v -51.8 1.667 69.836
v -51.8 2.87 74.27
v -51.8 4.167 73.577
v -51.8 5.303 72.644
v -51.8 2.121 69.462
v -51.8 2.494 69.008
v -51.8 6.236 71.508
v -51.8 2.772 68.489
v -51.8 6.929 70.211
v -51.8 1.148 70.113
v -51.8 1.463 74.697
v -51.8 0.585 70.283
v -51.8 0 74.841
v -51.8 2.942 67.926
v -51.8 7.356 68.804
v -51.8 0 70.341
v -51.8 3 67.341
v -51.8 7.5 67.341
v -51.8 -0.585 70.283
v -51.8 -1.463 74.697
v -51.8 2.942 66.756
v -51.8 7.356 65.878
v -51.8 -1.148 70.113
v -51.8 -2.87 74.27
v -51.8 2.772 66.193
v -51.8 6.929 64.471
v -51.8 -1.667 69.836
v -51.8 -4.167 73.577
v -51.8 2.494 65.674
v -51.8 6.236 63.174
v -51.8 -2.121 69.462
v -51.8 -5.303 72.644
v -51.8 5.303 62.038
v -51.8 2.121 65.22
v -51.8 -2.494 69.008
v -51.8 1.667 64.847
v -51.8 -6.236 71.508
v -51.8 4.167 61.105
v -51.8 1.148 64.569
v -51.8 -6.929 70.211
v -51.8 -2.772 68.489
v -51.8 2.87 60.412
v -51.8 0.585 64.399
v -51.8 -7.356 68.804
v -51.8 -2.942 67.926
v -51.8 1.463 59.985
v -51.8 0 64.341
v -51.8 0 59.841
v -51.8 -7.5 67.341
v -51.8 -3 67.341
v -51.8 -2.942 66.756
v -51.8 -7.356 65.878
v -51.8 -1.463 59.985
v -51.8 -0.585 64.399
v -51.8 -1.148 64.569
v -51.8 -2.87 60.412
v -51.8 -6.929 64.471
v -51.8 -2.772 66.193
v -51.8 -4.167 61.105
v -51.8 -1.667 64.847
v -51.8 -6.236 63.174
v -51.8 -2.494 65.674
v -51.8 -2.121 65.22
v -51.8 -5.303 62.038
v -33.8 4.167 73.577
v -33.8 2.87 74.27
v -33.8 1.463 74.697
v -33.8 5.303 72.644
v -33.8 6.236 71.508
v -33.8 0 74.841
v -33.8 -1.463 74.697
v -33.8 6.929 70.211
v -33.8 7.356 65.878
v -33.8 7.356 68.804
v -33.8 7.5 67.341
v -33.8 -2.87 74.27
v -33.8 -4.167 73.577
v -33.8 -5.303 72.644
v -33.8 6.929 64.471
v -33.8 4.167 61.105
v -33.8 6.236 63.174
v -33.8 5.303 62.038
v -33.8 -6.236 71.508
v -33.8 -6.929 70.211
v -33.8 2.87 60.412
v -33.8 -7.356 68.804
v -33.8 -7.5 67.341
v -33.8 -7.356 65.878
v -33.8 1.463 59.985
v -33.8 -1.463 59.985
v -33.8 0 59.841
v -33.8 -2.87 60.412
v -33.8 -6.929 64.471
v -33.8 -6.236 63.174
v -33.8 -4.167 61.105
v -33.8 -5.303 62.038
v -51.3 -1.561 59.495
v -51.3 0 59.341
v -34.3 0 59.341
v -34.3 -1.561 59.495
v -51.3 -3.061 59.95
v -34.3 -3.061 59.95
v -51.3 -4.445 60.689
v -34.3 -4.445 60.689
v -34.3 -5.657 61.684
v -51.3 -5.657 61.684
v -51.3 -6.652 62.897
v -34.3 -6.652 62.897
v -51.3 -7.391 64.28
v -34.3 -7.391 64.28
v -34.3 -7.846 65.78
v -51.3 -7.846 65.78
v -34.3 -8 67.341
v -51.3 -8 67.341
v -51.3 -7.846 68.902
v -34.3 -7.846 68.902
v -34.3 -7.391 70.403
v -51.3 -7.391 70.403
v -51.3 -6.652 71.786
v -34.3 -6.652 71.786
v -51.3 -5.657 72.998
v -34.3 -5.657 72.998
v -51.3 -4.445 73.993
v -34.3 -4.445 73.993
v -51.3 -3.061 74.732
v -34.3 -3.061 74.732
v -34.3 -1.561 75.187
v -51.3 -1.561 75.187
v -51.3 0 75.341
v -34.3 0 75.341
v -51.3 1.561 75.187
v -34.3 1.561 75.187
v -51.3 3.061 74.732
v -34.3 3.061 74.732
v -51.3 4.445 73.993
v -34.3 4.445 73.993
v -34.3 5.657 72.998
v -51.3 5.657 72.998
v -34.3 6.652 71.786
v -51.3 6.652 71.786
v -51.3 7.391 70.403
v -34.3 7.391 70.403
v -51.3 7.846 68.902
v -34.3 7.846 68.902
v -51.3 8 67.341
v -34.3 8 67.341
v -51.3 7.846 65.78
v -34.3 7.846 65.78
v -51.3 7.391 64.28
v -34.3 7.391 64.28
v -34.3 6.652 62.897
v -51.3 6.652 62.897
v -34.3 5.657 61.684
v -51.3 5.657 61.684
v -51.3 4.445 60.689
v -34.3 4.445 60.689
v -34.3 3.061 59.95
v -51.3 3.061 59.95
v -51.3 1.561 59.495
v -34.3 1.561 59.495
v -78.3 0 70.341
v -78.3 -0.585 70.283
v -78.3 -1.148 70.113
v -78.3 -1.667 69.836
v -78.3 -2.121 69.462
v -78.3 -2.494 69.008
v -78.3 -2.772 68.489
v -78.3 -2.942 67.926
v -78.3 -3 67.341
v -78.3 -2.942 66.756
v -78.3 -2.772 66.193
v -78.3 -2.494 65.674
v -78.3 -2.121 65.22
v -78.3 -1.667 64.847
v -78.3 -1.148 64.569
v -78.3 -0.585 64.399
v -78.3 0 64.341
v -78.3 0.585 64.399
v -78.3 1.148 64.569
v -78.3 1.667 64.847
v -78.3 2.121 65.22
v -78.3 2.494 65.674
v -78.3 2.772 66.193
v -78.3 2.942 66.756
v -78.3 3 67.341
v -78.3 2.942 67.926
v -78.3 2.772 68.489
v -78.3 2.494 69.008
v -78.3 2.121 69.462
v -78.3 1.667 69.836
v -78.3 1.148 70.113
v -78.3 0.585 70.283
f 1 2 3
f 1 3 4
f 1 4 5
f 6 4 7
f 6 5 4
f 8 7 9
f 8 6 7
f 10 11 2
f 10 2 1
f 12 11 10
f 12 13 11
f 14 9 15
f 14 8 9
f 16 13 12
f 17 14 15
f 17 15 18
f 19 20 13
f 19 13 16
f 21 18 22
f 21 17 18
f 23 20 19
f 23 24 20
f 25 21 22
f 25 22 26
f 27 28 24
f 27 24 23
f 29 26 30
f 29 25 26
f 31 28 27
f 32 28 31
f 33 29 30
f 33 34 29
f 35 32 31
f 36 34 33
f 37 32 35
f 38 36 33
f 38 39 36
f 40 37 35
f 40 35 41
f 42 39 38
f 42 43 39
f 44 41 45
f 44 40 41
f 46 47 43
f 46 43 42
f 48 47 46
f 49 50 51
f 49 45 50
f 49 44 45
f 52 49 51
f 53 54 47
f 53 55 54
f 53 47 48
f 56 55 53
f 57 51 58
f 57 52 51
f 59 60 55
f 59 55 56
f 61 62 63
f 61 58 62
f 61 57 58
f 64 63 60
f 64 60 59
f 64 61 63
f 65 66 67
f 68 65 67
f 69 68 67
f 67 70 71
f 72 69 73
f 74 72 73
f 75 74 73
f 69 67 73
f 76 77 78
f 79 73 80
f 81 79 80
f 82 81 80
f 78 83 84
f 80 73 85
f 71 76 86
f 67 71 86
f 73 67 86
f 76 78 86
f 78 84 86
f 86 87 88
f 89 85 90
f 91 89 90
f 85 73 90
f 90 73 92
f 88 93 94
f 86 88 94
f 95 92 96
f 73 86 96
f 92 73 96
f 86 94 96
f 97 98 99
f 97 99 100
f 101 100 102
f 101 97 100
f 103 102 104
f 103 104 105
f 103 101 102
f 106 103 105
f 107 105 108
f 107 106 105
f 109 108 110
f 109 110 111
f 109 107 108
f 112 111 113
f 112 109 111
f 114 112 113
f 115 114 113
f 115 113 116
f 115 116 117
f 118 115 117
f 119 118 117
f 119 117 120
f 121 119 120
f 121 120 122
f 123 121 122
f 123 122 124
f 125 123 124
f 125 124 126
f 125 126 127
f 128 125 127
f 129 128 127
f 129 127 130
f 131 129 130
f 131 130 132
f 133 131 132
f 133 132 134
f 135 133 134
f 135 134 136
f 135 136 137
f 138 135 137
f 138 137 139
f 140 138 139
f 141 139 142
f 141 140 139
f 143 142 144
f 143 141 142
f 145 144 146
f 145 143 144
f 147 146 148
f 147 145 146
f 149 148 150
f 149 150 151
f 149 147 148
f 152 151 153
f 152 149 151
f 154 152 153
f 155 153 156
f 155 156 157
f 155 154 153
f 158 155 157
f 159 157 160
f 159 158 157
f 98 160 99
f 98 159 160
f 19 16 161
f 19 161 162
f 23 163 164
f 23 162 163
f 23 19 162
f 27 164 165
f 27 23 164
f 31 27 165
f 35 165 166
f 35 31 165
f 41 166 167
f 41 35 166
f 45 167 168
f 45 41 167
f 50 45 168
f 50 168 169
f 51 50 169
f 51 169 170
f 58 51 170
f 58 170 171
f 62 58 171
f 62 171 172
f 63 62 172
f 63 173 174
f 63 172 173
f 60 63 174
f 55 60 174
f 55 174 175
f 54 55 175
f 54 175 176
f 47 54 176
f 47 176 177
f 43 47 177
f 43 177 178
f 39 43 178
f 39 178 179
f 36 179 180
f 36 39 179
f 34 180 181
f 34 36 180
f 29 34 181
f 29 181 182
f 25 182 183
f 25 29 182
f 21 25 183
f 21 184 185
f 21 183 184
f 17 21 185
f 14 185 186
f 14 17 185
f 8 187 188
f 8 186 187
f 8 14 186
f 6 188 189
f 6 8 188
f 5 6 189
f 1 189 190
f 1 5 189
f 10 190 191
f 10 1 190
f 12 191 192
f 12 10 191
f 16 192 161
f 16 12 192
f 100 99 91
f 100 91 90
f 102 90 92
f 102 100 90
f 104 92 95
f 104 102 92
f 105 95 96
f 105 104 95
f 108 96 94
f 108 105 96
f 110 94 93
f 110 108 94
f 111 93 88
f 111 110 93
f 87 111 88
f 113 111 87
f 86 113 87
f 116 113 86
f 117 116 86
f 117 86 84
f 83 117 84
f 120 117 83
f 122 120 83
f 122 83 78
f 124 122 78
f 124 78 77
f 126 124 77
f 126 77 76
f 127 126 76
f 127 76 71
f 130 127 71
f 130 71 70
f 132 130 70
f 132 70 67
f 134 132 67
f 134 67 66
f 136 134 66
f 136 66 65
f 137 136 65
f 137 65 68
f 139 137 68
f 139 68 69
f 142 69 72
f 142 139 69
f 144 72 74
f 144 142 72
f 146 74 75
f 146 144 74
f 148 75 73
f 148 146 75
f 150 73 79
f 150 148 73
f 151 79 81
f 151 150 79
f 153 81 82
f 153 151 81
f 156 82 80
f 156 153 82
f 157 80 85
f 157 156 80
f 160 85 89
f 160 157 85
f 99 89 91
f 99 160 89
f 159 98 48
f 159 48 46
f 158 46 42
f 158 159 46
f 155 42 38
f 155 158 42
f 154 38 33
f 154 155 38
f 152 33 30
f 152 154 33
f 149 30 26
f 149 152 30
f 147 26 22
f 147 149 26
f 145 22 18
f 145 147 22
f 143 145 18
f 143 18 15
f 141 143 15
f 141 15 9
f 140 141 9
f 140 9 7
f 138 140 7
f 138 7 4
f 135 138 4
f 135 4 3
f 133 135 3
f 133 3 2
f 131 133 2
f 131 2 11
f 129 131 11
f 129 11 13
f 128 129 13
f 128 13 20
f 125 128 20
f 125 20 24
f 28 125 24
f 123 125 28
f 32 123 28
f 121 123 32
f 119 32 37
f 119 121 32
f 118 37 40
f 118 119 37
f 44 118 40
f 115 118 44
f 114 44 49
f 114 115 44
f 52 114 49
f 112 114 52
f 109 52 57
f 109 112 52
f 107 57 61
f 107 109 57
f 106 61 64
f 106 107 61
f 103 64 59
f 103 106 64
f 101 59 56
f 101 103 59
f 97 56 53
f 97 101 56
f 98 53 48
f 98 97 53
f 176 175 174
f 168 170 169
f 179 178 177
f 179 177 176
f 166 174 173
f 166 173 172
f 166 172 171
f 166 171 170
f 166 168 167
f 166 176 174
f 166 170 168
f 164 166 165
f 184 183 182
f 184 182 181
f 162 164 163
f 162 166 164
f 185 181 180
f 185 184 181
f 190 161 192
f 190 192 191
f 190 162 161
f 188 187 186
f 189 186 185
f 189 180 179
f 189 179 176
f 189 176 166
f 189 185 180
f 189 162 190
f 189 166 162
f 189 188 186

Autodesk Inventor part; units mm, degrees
ref_plane "YZ Plane" through (0, 0, 0) normal (1, 0, 0) x (0, 1, 0)
ref_plane "XZ Plane" through (0, 0, 0) normal (0, 1, 0) x (-1, 0, 0)
ref_plane "XY Plane" through (0, 0, 0) normal (0, 0, 1) x (1, 0, 0)
sketch "スケッチ1" plane through (0, 0, 0) normal (0, 1, 0) x (-1, 0, 0)
  line L0 (-49.8489, 61.5411) -> (-49.8489, 83.4411)
  line L1 (-49.8489, 83.4411) -> (10.1511, 83.4411)
  line L2 (10.1511, 83.4411) -> (10.1511, 61.5411)
  line L3 (10.1511, 61.5411) -> (-8.8489, 61.5411)
  line L4 (-8.8489, 56.3412) -> (-8.8489, 74.3411)
  line L5 (-8.8489, 74.3411) -> (-15.9758, 74.3411)
  line L6 (-23.7218, 74.3411) -> (-30.8489, 74.3411)
  line L7 (-30.8489, 74.3411) -> (-30.8489, 56.3412)
  line L8 (-30.8489, 56.3411) -> (-8.8489, 56.3411)
  circle A0 centre (-19.8489, 67.3411) radius 8
  circle A1 centre (-19.8489, 67.3411) radius 7.5
  line L9 (-30.8489, 61.5411) -> (-49.8489, 61.5411)
  line L10 (-49.8489, 75.5411) -> (10.1511, 75.5411)
  line L11 (53.2984, 117.706) -> (53.2984, 177.706)
  line L12 (53.2984, 177.706) -> (143.2984, 177.706)
  line L13 (143.2984, 177.706) -> (143.2984, 117.706)
  line L14 (143.2984, 117.706) -> (53.2984, 117.706)
  circle A2 centre (83.9984, 122.706) radius 1.5
  circle A3 centre (83.9984, 147.706) radius 1.5
  circle A4 centre (93.9984, 147.706) radius 2.25
  circle A5 centre (83.9984, 172.706) radius 1.5
  circle A6 centre (108.9984, 172.706) radius 1.5
  circle A7 centre (133.9984, 172.706) radius 1.5
  circle A8 centre (133.9984, 147.706) radius 1.5
  circle A9 centre (123.9984, 147.706) radius 2.25
  circle A10 centre (108.9984, 147.706) radius 7.5
  circle A11 centre (108.9984, 122.706) radius 1.5
  circle A12 centre (133.9984, 122.706) radius 1.5
  line L15 (174.3262, 83.4411) -> (174.3262, 61.5411)
  line L16 (174.3262, 61.5411) -> (193.3262, 61.5411)
  line L17 (193.3262, 65.4411) -> (193.3262, 56.3412)
  line L18 (193.3262, 56.3411) -> (215.3262, 56.3411)
  line L19 (215.3262, 56.3412) -> (215.3262, 65.4411)
  line L20 (215.3262, 61.5411) -> (234.3263, 61.5411)
  line L21 (234.3263, 61.5411) -> (234.3263, 83.4411)
  line L22 (234.3263, 83.4411) -> (174.3262, 83.4411)
  line L23 (234.3263, 65.4411) -> (174.3262, 65.4411)
  line L24 (143.2984, 25.0403) -> (53.2984, 25.0403)
  line L25 (53.2984, 25.0403) -> (53.2984, -34.9597)
  line L26 (53.2984, -34.9597) -> (143.2984, -34.9597)
  line L27 (143.2984, -34.9597) -> (143.2984, 25.0403)
  line L28 (131.5644, 25.0403) -> (131.5644, -34.9597)
  circle A13 centre (108.9984, -29.9597) radius 1.5
  circle A14 centre (108.9984, -4.9597) radius 7.5
  circle A15 centre (123.9984, -4.9597) radius 2.25
  circle A16 centre (123.9984, -4.9597) radius 4
  circle A17 centre (108.9984, 20.0403) radius 1.5
  circle A18 centre (83.9984, 20.0403) radius 1.5
  line L29 (73.2984, 25.0403) -> (73.2984, 6.0403)
  line L30 (86.3001, -15.9597) -> (86.3001, 6.0403)
  line L31 (86.3001, 6.0403) -> (53.3001, 6.0403)
  line L32 (53.3001, 6.0403) -> (53.3001, -15.9597)
  line L33 (53.3001, -15.9597) -> (86.3001, -15.9597)
  line L34 (73.2984, -15.9597) -> (73.2984, -34.9597)
  line L35 (63.2984, -34.9597) -> (63.2984, -15.9597)
  line L36 (63.2984, 6.0403) -> (63.2984, 25.0403)
  circle A19 centre (83.9984, -29.9597) radius 1.5
  circle A20 centre (93.9984, -4.9597) radius 2.25
  circle A21 centre (93.9984, -4.9597) radius 4
  line L37 (-19.8489, 49.2711) -> (-19.8489, 87.2696)
  line L38 (-6.1616, 67.3411) -> (-35.9585, 67.3411)
  line L39 (83.9984, 23.5784) -> (83.9984, 16.5836)
  circle A22 centre (83.9984, 20.0403) radius 2
  line L40 (80.6576, 20.0403) -> (87.5893, 20.0403)
  line L41 (93.9984, 1.0394) -> (93.9984, -10.6526)
  line L42 (83.9984, -26.503) -> (83.9984, -33.4978)
  circle A23 centre (83.9984, -29.9597) radius 2
  line L43 (80.6576, -29.9597) -> (87.5893, -29.9597)
  line L44 (29.8273, -4.9597) -> (148.6488, -4.9597)
  line L45 (123.9984, -10.6526) -> (123.9984, 1.0394)
  line L46 (112.4368, 20.0403) -> (105.6741, 20.0403)
  circle A24 centre (108.9984, 20.0403) radius 2
  line L47 (108.9984, 32.4142) -> (108.9984, -41.5197)
  circle A25 centre (108.9984, -29.9597) radius 2
  line L48 (105.4074, -29.9597) -> (112.8092, -29.9597)
  circle A26 centre (108.9984, -4.9597) radius 8
  line L49 (108.9984, 111.8823) -> (108.9984, 183.8068)
  circle A27 centre (108.9984, 172.706) radius 2
  line L50 (105.6741, 172.706) -> (112.4368, 172.706)
  line L51 (130.4749, 172.706) -> (137.3391, 172.706)
  circle A28 centre (133.9984, 172.706) radius 2
  line L52 (133.9984, 169.2493) -> (133.9984, 176.2441)
  line L53 (123.9984, 153.3988) -> (123.9984, 141.7069)
  circle A29 centre (123.9984, 147.706) radius 4
  circle A30 centre (133.9984, 147.706) radius 2
  line L54 (133.9984, 151.0572) -> (133.9984, 144.2493)
  line L55 (148.6488, 147.706) -> (29.8273, 147.706)
  circle A31 centre (83.9984, 147.706) radius 2
  line L56 (83.9984, 151.0572) -> (83.9984, 144.2493)
  line L57 (93.9984, 141.7069) -> (93.9984, 153.3988)
  circle A32 centre (93.9984, 147.706) radius 4
  line L58 (83.9984, 169.2493) -> (83.9984, 176.2441)
  circle A33 centre (83.9984, 172.706) radius 2
  line L59 (80.6576, 172.706) -> (87.5893, 172.706)
  circle A34 centre (108.9984, 147.706) radius 8
  circle A35 centre (108.9984, 122.706) radius 2
  line L60 (105.4074, 122.706) -> (112.8092, 122.706)
  line L61 (130.8446, 122.706) -> (137.3391, 122.706)
  circle A36 centre (133.9984, 122.706) radius 2
  line L62 (133.9984, 126.1627) -> (133.9984, 119.1679)
  line L63 (87.5893, 122.706) -> (80.6576, 122.706)
  circle A37 centre (83.9984, 122.706) radius 2
  line L64 (83.9984, 126.1627) -> (83.9984, 119.1679)
  line L65 (204.3262, 87.2696) -> (204.3262, 49.2711)
  line L66 (176.3262, 70.0686) -> (232.3263, 70.0686)
  line L67 (82.1365, 4.0403) -> (82.1365, -13.9597)
  line L68 (51.8001, 144.706) -> (51.8001, 150.706)
  line L69 (53.2984, 150.706) -> (51.8001, 150.706)
  line L70 (53.2984, 144.706) -> (51.8001, 144.706)
  line L71 (33.8001, 155.206) -> (33.8001, 140.206)
  line L72 (33.8001, 140.206) -> (34.3001, 139.706)
  line L73 (34.3001, 139.706) -> (51.3001, 139.706)
  line L74 (51.3001, 139.706) -> (51.8001, 140.206)
  line L75 (51.8001, 140.206) -> (51.8001, 155.206)
  line L76 (51.8001, 155.206) -> (51.3001, 155.706)
  line L77 (51.3001, 155.706) -> (34.3001, 155.706)
  line L78 (34.3001, 155.706) -> (33.8001, 155.206)
  line L79 (34.3001, 155.706) -> (34.3001, 139.706)
  line L80 (51.3001, 139.706) -> (51.3001, 155.706)
  line L81 (51.8001, -7.9597) -> (51.8001, -1.9597)
  line L82 (53.3001, -1.9597) -> (51.8001, -1.9597)
  line L83 (53.3001, -7.9597) -> (51.8001, -7.9597)
  line L84 (33.8001, 2.5403) -> (33.8001, -12.4597)
  line L85 (33.8001, -12.4597) -> (34.3001, -12.9597)
  line L86 (34.3001, -12.9597) -> (51.3001, -12.9597)
  line L87 (51.3001, -12.9597) -> (51.8001, -12.4597)
  line L88 (51.8001, -12.4597) -> (51.8001, 2.5403)
  line L89 (51.8001, 2.5403) -> (51.3001, 3.0403)
  line L90 (51.3001, 3.0403) -> (34.3001, 3.0403)
  line L91 (34.3001, 3.0403) -> (33.8001, 2.5403)
  line L92 (34.3001, 3.0403) -> (34.3001, -12.9597)
  line L93 (51.3001, -12.9597) -> (51.3001, 3.0403)
  line L94 (28.0972, 67.3411) -> (83.3407, 67.3411)
  line L95 (82.8984, 75.4411) -> (90.6984, 75.4411)
  line L96 (127.3984, 75.4411) -> (133.1984, 75.4411)
  line L97 (134.7552, 70.5411) -> (131.5724, 67.3583)
  line L98 (82.4415, 71.3411) -> (86.3001, 67.4825)
  line L99 (78.3001, 69.4911) -> (75.8001, 69.4911)
  line L100 (78.3001, 65.1911) -> (75.8001, 65.1911)
  line L101 (75.8001, 64.8411) -> (75.8001, 69.8411)
  line L102 (75.3001, 70.3411) -> (73.1569, 70.3411)
  line L103 (75.3001, 64.3411) -> (73.1569, 64.3411)
  line L104 (75.8001, 69.8411) -> (73.1569, 69.8411)
  line L105 (75.8001, 64.8411) -> (73.1569, 64.8411)
  line L106 (51.8001, 64.3411) -> (51.8001, 70.3411)
  line L107 (53.3001, 70.3411) -> (51.8001, 70.3411)
  line L108 (53.3001, 64.3411) -> (51.8001, 64.3411)
  line L109 (33.8001, 74.8411) -> (33.8001, 59.8411)
  line L110 (33.8001, 59.8411) -> (34.3001, 59.3411)
  line L111 (34.3001, 59.3411) -> (51.3001, 59.3411)
  line L112 (51.3001, 59.3411) -> (51.8001, 59.8411)
  line L113 (51.8001, 59.8411) -> (51.8001, 74.8411)
  line L114 (51.8001, 74.8411) -> (51.3001, 75.3411)
  line L115 (51.3001, 75.3411) -> (34.3001, 75.3411)
  line L116 (34.3001, 75.3411) -> (33.8001, 74.8411)
  line L117 (34.3001, 75.3411) -> (34.3001, 59.3411)
  line L118 (51.3001, 59.3411) -> (51.3001, 75.3411)
  line L119 (54.3001, 74.3411) -> (60.3001, 74.3411)
  line L120 (54.3001, 56.3411) -> (80.2082, 56.3411)
  line L121 (53.3001, 57.3411) -> (53.3001, 73.3411)
  line L122 (86.3001, 60.5366) -> (86.3001, 67.4825)
  line L123 (61.3001, 62.3411) -> (61.3001, 73.3411)
  line L124 (62.3001, 61.3411) -> (77.3001, 61.3411)
  line L125 (78.3001, 62.3411) -> (78.3001, 70.3411)
  line L126 (79.3001, 71.3411) -> (82.4415, 71.3411)
  line L127 (82.1365, 57.0429) -> (86.3001, 60.5366)
  arc A38 (80.2082, 56.3411) -> (82.1365, 57.0429) centre (80.2082, 59.3411) ccw
  arc A39 (54.3001, 74.3411) -> (53.3001, 73.3411) centre (54.3001, 73.3411) ccw
  arc A40 (61.3001, 73.3411) -> (60.3001, 74.3411) centre (60.3001, 73.3411) ccw
  arc A41 (53.3001, 57.3411) -> (54.3001, 56.3411) centre (54.3001, 57.3411) ccw
  arc A42 (61.3001, 62.3411) -> (62.3001, 61.3411) centre (62.3001, 62.3411) ccw
  arc A43 (77.3001, 61.3411) -> (78.3001, 62.3411) centre (77.3001, 62.3411) ccw
  arc A44 (79.3001, 71.3411) -> (78.3001, 70.3411) centre (79.3001, 70.3411) ccw
  line L128 (63.1569, 70.3411) -> (61.3001, 70.3411)
  line L129 (63.1569, 69.8411) -> (61.3001, 69.8411)
  line L130 (63.1569, 64.8411) -> (61.3001, 64.8411)
  line L131 (63.1569, 64.3411) -> (61.3001, 64.3411)
  line L132 (75.3001, 70.3411) -> (75.8001, 69.8411)
  line L133 (75.3001, 64.3411) -> (75.8001, 64.8411)
  arc A45 (63.2984, 63.5411) -> (65.2984, 61.5411) centre (65.2984, 63.5411) ccw
  line L134 (65.2984, 61.5411) -> (71.2984, 61.5411)
  arc A46 (71.2984, 61.5411) -> (73.2984, 63.5411) centre (71.2984, 63.5411) ccw
  line L135 (73.2984, 63.5411) -> (73.2984, 75.0411)
  line L136 (135.2984, 75.8411) -> (135.2984, 70.7411)
  line L137 (143.2984, 72.6666) -> (143.2984, 83.4411)
  line L138 (143.2984, 83.4411) -> (53.2984, 83.4411)
  line L139 (53.2984, 83.4411) -> (53.2984, 76.5411)
  arc A47 (53.2984, 76.5411) -> (54.2984, 75.5411) centre (54.2984, 76.5411) ccw
  line L140 (54.2984, 75.5411) -> (62.2984, 75.5411)
  arc A48 (63.2984, 74.5411) -> (62.2984, 75.5411) centre (62.2984, 74.5411) ccw
  line L141 (63.2984, 74.5411) -> (63.2984, 63.5411)
  line L142 (74.2984, 76.0411) -> (82.2984, 76.0411)
  line L143 (133.7984, 76.0411) -> (133.1984, 75.4411)
  line L144 (127.3984, 75.4411) -> (126.7984, 76.0411)
  line L145 (90.6984, 75.4411) -> (91.2984, 76.0411)
  line L146 (82.8984, 75.4411) -> (82.2984, 76.0411)
  line L147 (91.2984, 76.0411) -> (126.7984, 76.0411)
  arc A49 (74.2984, 76.0411) -> (73.2984, 75.0411) centre (74.2984, 75.0411) ccw
  line L148 (133.7984, 76.0411) -> (135.0984, 76.0411)
  arc A50 (135.2984, 75.8411) -> (135.0984, 76.0411) centre (135.0984, 75.8411) ccw
  line L149 (135.0984, 70.5411) -> (134.7552, 70.5411)
  arc A51 (135.0984, 70.5411) -> (135.2984, 70.7411) centre (135.0984, 70.7411) ccw
  arc A52 (131.5724, 67.3583) -> (134.1894, 65.6755) centre (133.3144, 67.1911) ccw
  line L150 (134.1894, 65.6755) -> (141.7984, 70.0686)
  arc A53 (141.7984, 70.0686) -> (143.2984, 72.6666) centre (140.2984, 72.6666) ccw
  line L151 (124.9984, 127.8911) -> (124.9984, 123.5209)
  line L152 (127.1835, 125.706) -> (122.8133, 125.706)
  circle A54 centre (124.9984, 125.706) radius 1
  circle A55 centre (124.9984, 125.706) radius 1.5
  line L153 (124.9984, 167.5209) -> (124.9984, 171.8911)
  line L154 (127.1835, 169.706) -> (122.8133, 169.706)
  circle A56 centre (124.9984, 169.706) radius 1
  circle A57 centre (124.9984, 169.706) radius 1.5
  line L155 (58.9984, 127.8911) -> (58.9984, 123.5209)
  line L156 (61.1835, 125.706) -> (56.8133, 125.706)
  circle A58 centre (58.9984, 125.706) radius 1
  circle A59 centre (58.9984, 125.706) radius 1.5
  line L157 (58.9984, 167.5209) -> (58.9984, 171.8911)
  line L158 (61.1835, 169.706) -> (56.8133, 169.706)
  circle A60 centre (58.9984, 169.706) radius 1
  circle A61 centre (58.9984, 169.706) radius 1.5
  line L159 (34.3001, 154.706) -> (49.1751, 154.706)
  line L160 (34.3001, 153.706) -> (47.0501, 153.706)
  line L161 (34.3001, 152.706) -> (44.9251, 152.706)
  line L162 (34.3001, 151.706) -> (42.8001, 151.706)
  line L163 (34.3001, 150.706) -> (40.6751, 150.706)
  line L164 (34.3001, 149.706) -> (38.5501, 149.706)
  line L165 (34.3001, 148.706) -> (36.4251, 148.706)
  line L166 (34.3001, 2.0403) -> (49.1751, 2.0403)
  line L167 (34.3001, 1.0403) -> (47.0501, 1.0403)
  line L168 (34.3001, 0.0403) -> (44.9251, 0.0403)
  line L169 (34.3001, -0.9597) -> (42.8001, -0.9597)
  line L170 (34.3001, -1.9597) -> (40.6751, -1.9597)
  line L171 (34.3001, -2.9597) -> (38.5501, -2.9597)
  line L172 (34.3001, -3.9597) -> (36.4251, -3.9597)
  line L173 (108.9984, 51.8579) -> (108.9984, 88.7279)
  line L174 (34.3001, 74.3411) -> (49.1751, 74.3411)
  line L175 (34.3001, 73.3411) -> (47.0501, 73.3411)
  line L176 (34.3001, 72.3411) -> (44.9251, 72.3411)
  line L177 (34.3001, 71.3411) -> (42.8001, 71.3411)
  line L178 (34.3001, 70.3411) -> (40.6751, 70.3411)
  line L179 (34.3001, 69.3411) -> (38.5501, 69.3411)
  line L180 (34.3001, 68.3411) -> (36.4251, 68.3411)
  point P0 (0, 0)
  point P1 (209.8216, -24.5126)
  point P2 (209.8216, -11.7034)
  point P3 (51.8001, 67.3411)
  point P4 (33.8001, 67.3411)
revolve "回転1" add sketch "スケッチ1" angle 360 about axis through (-28.0972, 0, 67.3411) along (-1, 0, 0) contours L94 L117 L110 L109 | L94 L118 L111 L117 | L94 L106 L113 L112 L118
sketch "スケッチ2" plane through (-51.8001, 0, 67.3411) normal (-1, 0, 0) x (0, 0, 1)
  circle A0 centre (0, 0) radius 3
  point P0 (-67.3411, 0)
  dimension "d1" = 6
extrude "押し出し1" add sketch "スケッチ2" along normal blind 26.5
thread "ねじ1" size "M6x1" class "6g" standard "ANSI Metric M Profile" full length
properties part number "carrier_handle" material "UHMW、黒"
